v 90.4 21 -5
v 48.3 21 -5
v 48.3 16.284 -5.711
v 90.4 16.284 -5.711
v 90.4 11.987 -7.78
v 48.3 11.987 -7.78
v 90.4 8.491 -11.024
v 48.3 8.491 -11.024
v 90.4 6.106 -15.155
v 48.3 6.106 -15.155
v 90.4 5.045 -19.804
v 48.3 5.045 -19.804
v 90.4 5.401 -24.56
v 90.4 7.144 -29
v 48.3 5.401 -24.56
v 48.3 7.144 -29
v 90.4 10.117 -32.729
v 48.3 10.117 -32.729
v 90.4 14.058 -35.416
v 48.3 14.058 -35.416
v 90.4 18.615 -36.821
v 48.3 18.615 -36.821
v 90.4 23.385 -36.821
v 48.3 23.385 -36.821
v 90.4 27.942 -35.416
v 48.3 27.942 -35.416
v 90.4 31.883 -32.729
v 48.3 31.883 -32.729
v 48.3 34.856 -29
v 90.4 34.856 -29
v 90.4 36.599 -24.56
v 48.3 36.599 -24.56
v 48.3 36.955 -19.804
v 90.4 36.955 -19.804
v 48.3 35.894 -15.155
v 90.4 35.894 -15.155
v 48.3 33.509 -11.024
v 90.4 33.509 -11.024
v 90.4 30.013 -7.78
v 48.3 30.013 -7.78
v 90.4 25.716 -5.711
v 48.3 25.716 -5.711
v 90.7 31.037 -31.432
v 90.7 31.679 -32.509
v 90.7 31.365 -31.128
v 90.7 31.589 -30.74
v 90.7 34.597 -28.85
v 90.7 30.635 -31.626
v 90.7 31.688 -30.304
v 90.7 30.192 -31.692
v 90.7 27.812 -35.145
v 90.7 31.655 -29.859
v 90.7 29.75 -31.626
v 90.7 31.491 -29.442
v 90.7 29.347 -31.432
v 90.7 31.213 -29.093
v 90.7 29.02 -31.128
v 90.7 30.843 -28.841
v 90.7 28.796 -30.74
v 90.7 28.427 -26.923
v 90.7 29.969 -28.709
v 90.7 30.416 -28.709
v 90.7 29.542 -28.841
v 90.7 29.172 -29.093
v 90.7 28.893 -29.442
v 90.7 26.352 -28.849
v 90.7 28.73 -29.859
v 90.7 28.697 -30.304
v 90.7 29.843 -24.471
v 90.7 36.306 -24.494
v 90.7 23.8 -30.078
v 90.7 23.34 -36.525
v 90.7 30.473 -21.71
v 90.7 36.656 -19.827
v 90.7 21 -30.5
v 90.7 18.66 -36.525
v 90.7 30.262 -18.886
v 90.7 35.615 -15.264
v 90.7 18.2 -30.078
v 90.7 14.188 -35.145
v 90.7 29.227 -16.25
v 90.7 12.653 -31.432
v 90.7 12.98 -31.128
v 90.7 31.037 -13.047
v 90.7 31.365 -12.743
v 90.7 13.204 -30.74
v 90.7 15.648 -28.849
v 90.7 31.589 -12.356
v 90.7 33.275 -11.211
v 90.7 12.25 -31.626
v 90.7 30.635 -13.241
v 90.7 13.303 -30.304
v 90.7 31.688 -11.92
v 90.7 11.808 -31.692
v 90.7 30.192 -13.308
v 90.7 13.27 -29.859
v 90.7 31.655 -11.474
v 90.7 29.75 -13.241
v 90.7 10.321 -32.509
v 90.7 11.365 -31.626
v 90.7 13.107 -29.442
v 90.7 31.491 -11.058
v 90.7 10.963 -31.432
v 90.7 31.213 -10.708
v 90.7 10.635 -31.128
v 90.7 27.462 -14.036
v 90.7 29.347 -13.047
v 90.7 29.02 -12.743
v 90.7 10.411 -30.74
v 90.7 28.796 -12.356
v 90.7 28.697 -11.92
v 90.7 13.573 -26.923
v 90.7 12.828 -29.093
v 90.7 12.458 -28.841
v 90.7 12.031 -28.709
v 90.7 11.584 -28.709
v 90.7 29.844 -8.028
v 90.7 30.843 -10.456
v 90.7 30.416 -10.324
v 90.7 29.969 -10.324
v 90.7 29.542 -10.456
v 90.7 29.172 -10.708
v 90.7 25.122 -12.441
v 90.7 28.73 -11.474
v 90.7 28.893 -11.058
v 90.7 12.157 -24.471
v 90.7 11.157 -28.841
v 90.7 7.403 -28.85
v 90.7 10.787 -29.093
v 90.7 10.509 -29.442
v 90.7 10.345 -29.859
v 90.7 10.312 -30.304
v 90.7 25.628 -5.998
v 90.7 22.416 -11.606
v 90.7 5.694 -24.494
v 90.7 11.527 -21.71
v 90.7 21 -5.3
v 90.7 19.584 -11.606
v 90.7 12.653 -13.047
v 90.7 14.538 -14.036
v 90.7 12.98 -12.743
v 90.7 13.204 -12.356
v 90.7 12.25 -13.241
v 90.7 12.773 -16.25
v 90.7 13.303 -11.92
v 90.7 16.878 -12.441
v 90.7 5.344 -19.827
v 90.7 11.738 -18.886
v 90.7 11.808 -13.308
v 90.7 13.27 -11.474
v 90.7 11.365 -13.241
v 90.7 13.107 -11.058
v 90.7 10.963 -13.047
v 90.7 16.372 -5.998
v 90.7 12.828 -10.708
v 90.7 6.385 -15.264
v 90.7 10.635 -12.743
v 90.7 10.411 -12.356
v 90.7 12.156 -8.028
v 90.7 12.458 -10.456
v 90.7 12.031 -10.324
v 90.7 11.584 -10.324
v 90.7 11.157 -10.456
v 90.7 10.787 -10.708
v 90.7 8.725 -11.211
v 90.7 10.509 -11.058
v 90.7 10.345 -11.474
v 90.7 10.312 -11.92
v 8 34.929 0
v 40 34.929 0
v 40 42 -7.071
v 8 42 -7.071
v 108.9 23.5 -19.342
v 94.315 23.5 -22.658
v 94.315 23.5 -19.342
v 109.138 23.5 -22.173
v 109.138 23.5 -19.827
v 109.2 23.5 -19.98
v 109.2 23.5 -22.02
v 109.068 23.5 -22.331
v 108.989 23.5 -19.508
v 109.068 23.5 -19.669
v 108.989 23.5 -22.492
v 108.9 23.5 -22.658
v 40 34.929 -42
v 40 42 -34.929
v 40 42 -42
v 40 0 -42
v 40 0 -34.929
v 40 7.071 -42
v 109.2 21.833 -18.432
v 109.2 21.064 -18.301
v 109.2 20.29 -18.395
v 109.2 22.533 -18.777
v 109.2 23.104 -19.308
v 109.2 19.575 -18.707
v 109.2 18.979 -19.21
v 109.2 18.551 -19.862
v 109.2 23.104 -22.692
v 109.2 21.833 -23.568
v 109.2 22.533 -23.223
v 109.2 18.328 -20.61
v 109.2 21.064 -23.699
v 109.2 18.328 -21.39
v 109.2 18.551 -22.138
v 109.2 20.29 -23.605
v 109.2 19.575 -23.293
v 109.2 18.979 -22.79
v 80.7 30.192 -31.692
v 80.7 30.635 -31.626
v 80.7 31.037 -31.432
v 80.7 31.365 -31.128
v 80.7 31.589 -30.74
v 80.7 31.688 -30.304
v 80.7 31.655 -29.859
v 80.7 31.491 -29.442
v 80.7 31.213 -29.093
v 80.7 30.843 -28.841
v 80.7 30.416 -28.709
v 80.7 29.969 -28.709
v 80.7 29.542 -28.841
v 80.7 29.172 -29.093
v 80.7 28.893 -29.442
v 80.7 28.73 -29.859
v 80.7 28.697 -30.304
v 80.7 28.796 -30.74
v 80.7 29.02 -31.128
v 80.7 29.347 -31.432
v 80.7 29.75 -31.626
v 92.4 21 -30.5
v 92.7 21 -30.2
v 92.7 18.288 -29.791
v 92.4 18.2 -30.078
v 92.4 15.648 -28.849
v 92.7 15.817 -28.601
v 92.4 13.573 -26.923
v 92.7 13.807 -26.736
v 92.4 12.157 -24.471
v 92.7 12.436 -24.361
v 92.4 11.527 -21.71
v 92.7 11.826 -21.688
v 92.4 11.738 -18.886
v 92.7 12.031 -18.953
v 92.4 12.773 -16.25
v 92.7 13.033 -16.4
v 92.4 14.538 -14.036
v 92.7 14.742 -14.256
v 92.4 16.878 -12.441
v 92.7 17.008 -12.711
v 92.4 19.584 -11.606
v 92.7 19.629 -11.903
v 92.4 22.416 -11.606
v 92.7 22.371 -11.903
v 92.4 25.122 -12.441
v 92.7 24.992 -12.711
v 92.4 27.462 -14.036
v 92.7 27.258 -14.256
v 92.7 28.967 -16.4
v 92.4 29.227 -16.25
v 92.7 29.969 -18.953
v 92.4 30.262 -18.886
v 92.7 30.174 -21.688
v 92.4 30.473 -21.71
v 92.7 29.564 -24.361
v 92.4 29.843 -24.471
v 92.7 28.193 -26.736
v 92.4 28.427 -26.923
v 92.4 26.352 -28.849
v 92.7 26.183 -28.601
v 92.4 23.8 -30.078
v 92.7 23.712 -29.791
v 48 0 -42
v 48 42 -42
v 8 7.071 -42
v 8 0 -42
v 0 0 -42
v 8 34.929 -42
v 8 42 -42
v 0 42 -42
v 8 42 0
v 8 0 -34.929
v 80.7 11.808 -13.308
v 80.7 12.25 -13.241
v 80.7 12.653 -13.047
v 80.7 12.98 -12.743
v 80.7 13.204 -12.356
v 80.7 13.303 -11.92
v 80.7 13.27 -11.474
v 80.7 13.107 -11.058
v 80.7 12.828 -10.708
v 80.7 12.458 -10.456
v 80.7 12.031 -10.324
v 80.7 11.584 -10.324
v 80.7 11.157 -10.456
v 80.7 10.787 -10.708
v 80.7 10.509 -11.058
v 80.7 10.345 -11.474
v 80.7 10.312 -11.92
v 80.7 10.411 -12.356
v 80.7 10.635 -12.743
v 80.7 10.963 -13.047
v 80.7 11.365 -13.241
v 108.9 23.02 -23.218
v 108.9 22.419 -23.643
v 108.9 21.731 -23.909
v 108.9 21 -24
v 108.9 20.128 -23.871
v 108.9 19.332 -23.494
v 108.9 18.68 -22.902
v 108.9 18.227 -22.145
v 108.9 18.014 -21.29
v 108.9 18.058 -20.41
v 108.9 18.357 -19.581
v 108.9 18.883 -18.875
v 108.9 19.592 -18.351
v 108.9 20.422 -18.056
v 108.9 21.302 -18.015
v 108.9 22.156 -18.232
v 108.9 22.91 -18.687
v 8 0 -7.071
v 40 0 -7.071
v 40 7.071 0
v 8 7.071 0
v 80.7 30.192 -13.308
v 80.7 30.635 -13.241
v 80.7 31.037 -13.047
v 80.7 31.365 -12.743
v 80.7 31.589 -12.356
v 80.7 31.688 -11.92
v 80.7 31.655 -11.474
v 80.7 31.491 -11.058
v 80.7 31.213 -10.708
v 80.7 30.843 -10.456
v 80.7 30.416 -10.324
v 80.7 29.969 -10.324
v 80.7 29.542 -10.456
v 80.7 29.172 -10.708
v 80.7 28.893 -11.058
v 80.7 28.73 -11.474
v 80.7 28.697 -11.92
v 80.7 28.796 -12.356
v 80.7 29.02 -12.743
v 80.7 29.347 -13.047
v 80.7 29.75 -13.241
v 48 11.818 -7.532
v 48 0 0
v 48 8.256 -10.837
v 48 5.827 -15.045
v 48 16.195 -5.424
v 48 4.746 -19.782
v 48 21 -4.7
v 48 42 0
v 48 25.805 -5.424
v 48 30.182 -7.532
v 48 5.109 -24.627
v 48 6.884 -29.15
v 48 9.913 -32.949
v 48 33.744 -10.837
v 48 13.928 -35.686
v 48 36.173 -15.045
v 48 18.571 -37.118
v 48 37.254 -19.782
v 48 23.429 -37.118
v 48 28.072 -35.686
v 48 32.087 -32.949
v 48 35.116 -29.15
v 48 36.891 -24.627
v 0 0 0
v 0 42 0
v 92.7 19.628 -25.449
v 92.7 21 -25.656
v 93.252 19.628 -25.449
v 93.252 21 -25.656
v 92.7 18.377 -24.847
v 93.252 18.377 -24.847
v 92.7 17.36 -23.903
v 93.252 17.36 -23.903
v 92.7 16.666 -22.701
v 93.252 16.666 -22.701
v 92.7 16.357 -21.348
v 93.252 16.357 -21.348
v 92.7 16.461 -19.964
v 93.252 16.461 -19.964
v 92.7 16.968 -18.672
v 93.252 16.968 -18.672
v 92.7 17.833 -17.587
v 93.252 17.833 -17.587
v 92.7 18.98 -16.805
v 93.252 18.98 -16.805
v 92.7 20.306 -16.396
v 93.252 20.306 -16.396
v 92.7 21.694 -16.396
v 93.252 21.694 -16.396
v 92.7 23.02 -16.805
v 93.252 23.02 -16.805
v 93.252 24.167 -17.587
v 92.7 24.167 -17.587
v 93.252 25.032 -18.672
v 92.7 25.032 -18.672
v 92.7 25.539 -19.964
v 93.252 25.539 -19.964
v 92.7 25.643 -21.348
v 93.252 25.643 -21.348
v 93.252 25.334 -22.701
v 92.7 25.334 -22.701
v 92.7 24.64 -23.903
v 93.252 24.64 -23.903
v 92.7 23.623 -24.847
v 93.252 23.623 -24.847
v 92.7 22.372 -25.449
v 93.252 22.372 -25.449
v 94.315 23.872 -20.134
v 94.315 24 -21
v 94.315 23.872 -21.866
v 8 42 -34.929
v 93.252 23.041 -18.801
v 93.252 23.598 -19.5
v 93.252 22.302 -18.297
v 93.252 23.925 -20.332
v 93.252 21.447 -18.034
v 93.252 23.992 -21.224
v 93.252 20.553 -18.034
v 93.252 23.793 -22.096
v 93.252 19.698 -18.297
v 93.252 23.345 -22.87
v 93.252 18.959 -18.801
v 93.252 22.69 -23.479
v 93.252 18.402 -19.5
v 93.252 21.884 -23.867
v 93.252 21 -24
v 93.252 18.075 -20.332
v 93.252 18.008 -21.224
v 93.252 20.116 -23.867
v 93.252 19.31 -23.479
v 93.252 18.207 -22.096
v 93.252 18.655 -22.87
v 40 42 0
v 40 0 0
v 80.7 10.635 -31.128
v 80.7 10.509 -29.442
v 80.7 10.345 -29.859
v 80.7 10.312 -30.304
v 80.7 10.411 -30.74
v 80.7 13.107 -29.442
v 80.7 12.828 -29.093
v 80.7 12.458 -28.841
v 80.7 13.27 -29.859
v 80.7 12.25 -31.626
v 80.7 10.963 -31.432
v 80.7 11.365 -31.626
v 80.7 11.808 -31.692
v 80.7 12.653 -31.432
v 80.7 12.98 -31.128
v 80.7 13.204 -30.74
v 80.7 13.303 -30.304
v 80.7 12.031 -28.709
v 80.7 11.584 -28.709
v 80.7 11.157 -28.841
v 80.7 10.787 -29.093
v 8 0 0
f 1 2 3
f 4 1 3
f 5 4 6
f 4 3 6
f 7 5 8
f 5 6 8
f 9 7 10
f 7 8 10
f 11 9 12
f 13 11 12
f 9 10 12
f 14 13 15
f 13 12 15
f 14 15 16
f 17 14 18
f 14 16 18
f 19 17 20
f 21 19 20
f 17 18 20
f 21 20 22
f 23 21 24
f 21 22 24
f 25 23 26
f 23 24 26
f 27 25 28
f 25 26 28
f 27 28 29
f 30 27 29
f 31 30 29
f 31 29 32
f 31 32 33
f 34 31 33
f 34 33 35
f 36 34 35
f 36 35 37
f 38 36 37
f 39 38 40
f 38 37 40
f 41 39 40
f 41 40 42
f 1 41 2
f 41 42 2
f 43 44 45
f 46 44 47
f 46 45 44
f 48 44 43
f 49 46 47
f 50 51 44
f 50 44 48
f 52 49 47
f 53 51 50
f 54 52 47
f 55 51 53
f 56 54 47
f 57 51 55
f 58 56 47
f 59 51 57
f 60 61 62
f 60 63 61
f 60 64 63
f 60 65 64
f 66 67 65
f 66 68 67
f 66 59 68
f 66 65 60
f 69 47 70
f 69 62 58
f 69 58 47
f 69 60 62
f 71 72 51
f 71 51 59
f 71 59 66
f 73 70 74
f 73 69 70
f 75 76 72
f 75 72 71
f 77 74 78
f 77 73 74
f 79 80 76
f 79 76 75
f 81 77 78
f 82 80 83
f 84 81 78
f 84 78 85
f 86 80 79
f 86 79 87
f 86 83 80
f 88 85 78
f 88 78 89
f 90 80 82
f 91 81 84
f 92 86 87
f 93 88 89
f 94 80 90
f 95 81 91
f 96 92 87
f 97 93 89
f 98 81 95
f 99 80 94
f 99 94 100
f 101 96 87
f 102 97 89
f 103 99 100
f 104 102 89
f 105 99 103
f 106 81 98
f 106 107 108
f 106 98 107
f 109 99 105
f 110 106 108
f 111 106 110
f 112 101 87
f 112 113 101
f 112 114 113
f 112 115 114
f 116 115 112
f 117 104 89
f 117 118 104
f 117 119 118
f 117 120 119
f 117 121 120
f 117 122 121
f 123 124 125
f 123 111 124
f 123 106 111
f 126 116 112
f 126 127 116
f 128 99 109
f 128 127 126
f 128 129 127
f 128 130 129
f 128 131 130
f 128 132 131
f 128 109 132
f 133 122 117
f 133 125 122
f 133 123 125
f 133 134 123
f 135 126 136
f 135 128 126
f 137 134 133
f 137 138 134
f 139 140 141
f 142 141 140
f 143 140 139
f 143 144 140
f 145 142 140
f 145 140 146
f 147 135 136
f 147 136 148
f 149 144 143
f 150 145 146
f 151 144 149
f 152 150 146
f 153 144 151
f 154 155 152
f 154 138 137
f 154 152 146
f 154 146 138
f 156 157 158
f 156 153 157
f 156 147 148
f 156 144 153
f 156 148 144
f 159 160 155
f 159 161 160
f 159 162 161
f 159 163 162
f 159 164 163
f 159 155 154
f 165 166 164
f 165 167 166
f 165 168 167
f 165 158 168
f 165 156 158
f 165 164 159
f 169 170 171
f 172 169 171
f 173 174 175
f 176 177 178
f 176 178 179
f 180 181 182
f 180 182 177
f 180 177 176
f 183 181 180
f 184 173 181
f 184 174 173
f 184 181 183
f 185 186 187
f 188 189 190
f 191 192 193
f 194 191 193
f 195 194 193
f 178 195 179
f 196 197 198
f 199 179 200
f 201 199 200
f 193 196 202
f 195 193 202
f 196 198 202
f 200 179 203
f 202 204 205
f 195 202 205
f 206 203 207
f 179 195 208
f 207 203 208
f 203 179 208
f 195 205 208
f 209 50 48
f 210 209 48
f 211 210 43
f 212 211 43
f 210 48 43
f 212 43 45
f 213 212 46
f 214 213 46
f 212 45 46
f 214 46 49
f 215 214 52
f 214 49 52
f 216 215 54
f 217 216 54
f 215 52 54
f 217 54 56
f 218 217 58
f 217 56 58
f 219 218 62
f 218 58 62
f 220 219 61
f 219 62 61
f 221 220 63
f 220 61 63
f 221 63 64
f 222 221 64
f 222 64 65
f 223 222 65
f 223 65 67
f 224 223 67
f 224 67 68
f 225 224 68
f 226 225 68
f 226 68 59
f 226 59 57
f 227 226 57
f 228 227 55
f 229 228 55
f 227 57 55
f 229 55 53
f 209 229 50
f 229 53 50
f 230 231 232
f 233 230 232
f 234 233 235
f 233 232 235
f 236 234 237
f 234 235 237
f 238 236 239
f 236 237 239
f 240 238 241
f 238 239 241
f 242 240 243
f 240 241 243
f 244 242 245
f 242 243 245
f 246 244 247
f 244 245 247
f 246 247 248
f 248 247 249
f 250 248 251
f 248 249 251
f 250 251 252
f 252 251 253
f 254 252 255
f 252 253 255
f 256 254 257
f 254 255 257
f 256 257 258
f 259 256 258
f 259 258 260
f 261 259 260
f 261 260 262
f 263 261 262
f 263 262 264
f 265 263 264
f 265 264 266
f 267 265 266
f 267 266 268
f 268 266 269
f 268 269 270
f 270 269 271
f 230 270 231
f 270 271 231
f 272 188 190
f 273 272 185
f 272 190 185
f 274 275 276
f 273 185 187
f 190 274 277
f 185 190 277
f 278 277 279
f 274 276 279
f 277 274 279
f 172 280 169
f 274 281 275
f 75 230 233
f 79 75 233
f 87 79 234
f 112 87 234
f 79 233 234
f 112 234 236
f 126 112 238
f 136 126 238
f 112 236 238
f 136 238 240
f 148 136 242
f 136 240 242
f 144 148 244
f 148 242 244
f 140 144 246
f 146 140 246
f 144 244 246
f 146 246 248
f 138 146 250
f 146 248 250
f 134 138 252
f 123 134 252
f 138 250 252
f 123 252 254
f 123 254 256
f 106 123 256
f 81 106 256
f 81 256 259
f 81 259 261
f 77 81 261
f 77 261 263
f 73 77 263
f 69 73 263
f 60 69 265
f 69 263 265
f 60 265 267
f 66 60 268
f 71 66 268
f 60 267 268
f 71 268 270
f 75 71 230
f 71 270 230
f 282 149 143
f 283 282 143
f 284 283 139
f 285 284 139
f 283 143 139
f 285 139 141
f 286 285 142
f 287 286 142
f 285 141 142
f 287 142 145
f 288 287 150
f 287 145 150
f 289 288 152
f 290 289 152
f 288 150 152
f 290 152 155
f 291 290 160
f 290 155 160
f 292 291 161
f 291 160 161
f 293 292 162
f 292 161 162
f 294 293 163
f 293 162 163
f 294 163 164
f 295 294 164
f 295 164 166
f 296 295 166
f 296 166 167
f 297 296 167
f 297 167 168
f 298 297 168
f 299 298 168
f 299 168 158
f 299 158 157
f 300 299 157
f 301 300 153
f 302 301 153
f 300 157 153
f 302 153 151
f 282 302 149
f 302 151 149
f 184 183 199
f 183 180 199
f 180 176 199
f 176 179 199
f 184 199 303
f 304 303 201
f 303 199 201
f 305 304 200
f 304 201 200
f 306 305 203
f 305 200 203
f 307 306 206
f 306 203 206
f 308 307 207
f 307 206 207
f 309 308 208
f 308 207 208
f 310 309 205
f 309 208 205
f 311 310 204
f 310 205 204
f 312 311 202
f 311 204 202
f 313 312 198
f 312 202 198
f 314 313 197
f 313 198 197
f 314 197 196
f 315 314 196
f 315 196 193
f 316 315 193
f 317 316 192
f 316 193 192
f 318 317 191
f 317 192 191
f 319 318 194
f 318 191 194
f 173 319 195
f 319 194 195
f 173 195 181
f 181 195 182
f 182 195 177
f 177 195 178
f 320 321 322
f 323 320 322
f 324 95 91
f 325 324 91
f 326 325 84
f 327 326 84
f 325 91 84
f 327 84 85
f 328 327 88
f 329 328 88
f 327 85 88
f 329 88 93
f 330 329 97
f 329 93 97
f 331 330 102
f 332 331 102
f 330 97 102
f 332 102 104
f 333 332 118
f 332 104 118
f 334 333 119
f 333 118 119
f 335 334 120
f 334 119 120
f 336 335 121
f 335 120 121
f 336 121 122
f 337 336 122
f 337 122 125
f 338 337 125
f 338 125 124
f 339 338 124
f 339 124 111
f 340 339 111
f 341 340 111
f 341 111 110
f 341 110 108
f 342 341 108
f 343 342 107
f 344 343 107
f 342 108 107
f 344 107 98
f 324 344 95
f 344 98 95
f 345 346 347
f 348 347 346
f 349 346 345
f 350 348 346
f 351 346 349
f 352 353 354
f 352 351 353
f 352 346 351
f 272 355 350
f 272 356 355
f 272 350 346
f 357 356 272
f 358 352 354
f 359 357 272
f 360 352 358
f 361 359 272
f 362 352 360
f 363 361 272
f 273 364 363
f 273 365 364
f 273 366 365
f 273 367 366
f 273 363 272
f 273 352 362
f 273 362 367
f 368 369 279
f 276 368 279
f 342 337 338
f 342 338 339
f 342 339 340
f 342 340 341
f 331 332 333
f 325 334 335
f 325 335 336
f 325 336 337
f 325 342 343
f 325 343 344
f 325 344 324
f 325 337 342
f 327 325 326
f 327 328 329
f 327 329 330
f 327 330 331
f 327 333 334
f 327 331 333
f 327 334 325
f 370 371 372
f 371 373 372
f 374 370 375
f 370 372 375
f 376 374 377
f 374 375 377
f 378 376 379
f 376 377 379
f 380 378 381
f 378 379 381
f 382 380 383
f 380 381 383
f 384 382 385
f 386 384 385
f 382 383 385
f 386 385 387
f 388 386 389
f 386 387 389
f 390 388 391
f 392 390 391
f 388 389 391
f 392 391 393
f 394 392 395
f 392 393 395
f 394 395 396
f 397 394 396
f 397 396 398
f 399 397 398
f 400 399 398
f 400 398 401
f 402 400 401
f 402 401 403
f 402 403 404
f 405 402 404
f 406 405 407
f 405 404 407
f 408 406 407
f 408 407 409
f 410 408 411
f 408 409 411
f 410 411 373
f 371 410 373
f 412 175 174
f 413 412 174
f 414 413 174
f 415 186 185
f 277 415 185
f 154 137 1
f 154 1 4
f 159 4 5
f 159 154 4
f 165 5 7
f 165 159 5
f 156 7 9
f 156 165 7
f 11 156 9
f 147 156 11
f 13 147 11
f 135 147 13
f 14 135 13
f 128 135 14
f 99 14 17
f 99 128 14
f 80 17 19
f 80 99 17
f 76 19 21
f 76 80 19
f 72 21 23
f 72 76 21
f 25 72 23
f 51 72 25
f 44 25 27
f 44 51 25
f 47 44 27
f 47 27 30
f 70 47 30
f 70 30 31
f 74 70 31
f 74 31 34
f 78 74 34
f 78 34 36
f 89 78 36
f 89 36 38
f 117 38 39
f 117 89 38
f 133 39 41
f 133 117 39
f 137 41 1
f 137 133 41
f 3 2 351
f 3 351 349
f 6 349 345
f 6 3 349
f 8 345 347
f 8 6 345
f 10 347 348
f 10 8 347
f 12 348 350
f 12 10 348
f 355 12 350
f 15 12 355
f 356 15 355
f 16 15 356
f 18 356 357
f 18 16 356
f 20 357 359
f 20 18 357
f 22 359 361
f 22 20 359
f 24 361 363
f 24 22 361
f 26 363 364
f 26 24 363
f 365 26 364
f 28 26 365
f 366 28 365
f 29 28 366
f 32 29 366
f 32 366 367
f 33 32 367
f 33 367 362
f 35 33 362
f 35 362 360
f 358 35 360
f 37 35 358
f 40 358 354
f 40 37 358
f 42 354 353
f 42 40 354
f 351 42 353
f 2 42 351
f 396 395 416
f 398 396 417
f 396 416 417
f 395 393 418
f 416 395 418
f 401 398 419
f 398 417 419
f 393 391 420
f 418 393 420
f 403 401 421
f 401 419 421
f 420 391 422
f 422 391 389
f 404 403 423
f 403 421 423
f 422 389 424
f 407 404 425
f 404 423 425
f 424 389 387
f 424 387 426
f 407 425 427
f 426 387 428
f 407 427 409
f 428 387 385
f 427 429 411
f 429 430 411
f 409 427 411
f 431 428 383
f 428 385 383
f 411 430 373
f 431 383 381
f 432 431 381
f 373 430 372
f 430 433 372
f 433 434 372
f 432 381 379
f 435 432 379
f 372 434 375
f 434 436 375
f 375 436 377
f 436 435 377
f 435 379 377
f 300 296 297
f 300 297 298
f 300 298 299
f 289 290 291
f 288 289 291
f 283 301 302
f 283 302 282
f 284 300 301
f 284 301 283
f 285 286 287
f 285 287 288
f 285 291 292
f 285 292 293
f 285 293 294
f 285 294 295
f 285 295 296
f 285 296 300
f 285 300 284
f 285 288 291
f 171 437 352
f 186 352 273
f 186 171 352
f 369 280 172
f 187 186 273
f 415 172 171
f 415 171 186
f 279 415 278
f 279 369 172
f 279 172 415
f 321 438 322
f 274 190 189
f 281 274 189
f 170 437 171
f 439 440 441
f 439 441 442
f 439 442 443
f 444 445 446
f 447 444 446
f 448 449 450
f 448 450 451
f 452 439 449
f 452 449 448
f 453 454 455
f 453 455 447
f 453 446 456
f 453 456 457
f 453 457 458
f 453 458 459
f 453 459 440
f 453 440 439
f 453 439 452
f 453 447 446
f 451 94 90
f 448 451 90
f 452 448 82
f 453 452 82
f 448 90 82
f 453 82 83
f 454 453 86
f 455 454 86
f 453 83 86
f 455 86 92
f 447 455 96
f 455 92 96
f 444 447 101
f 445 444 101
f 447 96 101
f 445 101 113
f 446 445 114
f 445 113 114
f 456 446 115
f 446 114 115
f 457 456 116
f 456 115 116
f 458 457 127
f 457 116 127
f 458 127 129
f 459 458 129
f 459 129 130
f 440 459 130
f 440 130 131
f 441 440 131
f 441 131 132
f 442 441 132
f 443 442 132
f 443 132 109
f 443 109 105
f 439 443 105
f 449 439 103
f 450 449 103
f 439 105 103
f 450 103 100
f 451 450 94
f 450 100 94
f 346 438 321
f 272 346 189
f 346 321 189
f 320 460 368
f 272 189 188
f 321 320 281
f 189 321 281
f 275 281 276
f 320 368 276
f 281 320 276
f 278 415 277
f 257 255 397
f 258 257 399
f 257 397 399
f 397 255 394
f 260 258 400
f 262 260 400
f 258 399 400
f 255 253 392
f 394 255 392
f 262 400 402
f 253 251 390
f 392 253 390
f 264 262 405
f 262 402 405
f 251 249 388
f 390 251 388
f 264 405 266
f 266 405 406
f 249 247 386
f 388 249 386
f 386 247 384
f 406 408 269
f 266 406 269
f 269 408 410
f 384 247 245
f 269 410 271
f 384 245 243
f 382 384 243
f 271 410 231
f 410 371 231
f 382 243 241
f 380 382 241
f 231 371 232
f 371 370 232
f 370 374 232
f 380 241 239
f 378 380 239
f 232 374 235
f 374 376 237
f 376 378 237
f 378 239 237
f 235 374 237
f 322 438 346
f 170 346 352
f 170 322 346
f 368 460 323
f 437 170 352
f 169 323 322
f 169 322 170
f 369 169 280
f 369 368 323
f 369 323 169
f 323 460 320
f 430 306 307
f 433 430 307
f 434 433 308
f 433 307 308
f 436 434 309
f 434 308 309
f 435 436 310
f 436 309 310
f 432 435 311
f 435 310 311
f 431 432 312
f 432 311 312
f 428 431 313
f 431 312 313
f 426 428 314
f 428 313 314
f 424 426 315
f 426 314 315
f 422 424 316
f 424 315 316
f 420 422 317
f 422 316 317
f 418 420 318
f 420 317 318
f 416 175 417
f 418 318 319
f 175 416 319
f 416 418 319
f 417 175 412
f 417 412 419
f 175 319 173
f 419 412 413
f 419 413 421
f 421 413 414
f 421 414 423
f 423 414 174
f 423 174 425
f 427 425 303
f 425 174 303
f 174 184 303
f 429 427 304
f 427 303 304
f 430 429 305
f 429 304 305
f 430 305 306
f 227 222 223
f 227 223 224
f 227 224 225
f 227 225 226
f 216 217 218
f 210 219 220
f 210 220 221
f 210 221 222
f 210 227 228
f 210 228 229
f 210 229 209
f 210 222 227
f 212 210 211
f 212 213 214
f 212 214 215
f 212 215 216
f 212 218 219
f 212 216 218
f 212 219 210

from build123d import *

# Parameters (mm, degrees)
SKETCH1_W           = 42
SKETCH1_H           = 42
BOSS_EXTRUDE1_DEPTH = 48
SKETCH2_R           = 16
BOSS_EXTRUDE2_DEPTH = 42.7
SKETCH7_W           = 16.587443852
SKETCH7_H           = 11.908554944
CUT_EXTRUDE1_DEPTH  = 2
CHAMFER1_SIZE       = 0.3
SKETCH8_R           = 1.5
CUT_EXTRUDE2_DEPTH  = 10
CUT_EXTRUDE3_DEPTH  = 32


with BuildPart() as part:
    # Sketch1 → Boss-Extrude1 (new body)
    with BuildSketch(Plane(origin=(0, 0, 0), x_dir=(0, 0, -1), z_dir=(1, 0, 0))):
        with Locations((21, 21)):
            Rectangle(SKETCH1_W, SKETCH1_H)
    extrude(amount=BOSS_EXTRUDE1_DEPTH)

    # Sketch2 → Boss-Extrude2 (add)
    with BuildSketch(Plane(origin=(48, 0, 0), x_dir=(0, 0, -1), z_dir=(1, 0, 0))):
        with Locations((21, 21)):
            Circle(SKETCH2_R)
    extrude(amount=BOSS_EXTRUDE2_DEPTH)

    # Sketch5 → Revolve1 (revolve)
    with BuildSketch(Plane(origin=(0, 0, -21), x_dir=(-1, 0, 0), z_dir=(0, 0, -1))):
        Polygon((-90.7, 30.5), (-92.7, 30.5), (-92.7, 25.65608714), (-93.252163767, 25.65608714), (-93.252163767, 24), (-109.2, 24), (-109.2, 21), (-90.7, 21), align=None)
    revolve(axis=Axis((109.2, 21, -21), (-1, 0, 0)))

    # Sketch7 → Cut-Extrude1 (cut)
    with BuildSketch(Plane(origin=(0, 23.5, 0), x_dir=(1, 0, 0), z_dir=(0, 1, 0))):
        with Locations((102.608605833, 20.527447563)):
            Rectangle(SKETCH7_W, SKETCH7_H)
    extrude(amount=CUT_EXTRUDE1_DEPTH, mode=Mode.SUBTRACT)

    # Chamfer1
    chamfer1_edges = [part.edges().sort_by_distance(p)[0] for p in [
        (48, 21, -5),
        (90.7, 21, -5),
        (92.7, 11.5, -21),
        (109.2, 18, -21),
    ]]
    chamfer(chamfer1_edges, length=CHAMFER1_SIZE)

    # Sketch8 → Cut-Extrude2 (cut)
    with BuildSketch(Plane(origin=(90.7, 0, 0), x_dir=(0, 0, -1), z_dir=(1, 0, 0))):
        with Locations((30.192388155, 30.192388155)):
            Circle(SKETCH8_R)
        with Locations((30.192388155, 11.807611845)):
            Circle(SKETCH8_R)
        with Locations((11.807611845, 30.192388155)):
            Circle(SKETCH8_R)
        with Locations((11.807611845, 11.807611845)):
            Circle(SKETCH8_R)
    extrude(amount=-CUT_EXTRUDE2_DEPTH, mode=Mode.SUBTRACT)

    # Sketch9 → Cut-Extrude3 (cut)
    with BuildSketch(Plane(origin=(40, 0, 0), x_dir=(0, 0, -1), z_dir=(1, 0, 0))):
        Polygon((34.928932188, 42), (42, 34.928932188), (42, 42), align=None)
        Polygon((42, 0), (42, 7.071067812), (34.928932188, 0), align=None)
        Polygon((0, 34.928932188), (7.071067812, 42), (0, 42), align=None)
        Polygon((0, 0), (7.071067812, 0), (0, 7.071067812), align=None)
    extrude(amount=-CUT_EXTRUDE3_DEPTH, mode=Mode.SUBTRACT)


solid = part.part
